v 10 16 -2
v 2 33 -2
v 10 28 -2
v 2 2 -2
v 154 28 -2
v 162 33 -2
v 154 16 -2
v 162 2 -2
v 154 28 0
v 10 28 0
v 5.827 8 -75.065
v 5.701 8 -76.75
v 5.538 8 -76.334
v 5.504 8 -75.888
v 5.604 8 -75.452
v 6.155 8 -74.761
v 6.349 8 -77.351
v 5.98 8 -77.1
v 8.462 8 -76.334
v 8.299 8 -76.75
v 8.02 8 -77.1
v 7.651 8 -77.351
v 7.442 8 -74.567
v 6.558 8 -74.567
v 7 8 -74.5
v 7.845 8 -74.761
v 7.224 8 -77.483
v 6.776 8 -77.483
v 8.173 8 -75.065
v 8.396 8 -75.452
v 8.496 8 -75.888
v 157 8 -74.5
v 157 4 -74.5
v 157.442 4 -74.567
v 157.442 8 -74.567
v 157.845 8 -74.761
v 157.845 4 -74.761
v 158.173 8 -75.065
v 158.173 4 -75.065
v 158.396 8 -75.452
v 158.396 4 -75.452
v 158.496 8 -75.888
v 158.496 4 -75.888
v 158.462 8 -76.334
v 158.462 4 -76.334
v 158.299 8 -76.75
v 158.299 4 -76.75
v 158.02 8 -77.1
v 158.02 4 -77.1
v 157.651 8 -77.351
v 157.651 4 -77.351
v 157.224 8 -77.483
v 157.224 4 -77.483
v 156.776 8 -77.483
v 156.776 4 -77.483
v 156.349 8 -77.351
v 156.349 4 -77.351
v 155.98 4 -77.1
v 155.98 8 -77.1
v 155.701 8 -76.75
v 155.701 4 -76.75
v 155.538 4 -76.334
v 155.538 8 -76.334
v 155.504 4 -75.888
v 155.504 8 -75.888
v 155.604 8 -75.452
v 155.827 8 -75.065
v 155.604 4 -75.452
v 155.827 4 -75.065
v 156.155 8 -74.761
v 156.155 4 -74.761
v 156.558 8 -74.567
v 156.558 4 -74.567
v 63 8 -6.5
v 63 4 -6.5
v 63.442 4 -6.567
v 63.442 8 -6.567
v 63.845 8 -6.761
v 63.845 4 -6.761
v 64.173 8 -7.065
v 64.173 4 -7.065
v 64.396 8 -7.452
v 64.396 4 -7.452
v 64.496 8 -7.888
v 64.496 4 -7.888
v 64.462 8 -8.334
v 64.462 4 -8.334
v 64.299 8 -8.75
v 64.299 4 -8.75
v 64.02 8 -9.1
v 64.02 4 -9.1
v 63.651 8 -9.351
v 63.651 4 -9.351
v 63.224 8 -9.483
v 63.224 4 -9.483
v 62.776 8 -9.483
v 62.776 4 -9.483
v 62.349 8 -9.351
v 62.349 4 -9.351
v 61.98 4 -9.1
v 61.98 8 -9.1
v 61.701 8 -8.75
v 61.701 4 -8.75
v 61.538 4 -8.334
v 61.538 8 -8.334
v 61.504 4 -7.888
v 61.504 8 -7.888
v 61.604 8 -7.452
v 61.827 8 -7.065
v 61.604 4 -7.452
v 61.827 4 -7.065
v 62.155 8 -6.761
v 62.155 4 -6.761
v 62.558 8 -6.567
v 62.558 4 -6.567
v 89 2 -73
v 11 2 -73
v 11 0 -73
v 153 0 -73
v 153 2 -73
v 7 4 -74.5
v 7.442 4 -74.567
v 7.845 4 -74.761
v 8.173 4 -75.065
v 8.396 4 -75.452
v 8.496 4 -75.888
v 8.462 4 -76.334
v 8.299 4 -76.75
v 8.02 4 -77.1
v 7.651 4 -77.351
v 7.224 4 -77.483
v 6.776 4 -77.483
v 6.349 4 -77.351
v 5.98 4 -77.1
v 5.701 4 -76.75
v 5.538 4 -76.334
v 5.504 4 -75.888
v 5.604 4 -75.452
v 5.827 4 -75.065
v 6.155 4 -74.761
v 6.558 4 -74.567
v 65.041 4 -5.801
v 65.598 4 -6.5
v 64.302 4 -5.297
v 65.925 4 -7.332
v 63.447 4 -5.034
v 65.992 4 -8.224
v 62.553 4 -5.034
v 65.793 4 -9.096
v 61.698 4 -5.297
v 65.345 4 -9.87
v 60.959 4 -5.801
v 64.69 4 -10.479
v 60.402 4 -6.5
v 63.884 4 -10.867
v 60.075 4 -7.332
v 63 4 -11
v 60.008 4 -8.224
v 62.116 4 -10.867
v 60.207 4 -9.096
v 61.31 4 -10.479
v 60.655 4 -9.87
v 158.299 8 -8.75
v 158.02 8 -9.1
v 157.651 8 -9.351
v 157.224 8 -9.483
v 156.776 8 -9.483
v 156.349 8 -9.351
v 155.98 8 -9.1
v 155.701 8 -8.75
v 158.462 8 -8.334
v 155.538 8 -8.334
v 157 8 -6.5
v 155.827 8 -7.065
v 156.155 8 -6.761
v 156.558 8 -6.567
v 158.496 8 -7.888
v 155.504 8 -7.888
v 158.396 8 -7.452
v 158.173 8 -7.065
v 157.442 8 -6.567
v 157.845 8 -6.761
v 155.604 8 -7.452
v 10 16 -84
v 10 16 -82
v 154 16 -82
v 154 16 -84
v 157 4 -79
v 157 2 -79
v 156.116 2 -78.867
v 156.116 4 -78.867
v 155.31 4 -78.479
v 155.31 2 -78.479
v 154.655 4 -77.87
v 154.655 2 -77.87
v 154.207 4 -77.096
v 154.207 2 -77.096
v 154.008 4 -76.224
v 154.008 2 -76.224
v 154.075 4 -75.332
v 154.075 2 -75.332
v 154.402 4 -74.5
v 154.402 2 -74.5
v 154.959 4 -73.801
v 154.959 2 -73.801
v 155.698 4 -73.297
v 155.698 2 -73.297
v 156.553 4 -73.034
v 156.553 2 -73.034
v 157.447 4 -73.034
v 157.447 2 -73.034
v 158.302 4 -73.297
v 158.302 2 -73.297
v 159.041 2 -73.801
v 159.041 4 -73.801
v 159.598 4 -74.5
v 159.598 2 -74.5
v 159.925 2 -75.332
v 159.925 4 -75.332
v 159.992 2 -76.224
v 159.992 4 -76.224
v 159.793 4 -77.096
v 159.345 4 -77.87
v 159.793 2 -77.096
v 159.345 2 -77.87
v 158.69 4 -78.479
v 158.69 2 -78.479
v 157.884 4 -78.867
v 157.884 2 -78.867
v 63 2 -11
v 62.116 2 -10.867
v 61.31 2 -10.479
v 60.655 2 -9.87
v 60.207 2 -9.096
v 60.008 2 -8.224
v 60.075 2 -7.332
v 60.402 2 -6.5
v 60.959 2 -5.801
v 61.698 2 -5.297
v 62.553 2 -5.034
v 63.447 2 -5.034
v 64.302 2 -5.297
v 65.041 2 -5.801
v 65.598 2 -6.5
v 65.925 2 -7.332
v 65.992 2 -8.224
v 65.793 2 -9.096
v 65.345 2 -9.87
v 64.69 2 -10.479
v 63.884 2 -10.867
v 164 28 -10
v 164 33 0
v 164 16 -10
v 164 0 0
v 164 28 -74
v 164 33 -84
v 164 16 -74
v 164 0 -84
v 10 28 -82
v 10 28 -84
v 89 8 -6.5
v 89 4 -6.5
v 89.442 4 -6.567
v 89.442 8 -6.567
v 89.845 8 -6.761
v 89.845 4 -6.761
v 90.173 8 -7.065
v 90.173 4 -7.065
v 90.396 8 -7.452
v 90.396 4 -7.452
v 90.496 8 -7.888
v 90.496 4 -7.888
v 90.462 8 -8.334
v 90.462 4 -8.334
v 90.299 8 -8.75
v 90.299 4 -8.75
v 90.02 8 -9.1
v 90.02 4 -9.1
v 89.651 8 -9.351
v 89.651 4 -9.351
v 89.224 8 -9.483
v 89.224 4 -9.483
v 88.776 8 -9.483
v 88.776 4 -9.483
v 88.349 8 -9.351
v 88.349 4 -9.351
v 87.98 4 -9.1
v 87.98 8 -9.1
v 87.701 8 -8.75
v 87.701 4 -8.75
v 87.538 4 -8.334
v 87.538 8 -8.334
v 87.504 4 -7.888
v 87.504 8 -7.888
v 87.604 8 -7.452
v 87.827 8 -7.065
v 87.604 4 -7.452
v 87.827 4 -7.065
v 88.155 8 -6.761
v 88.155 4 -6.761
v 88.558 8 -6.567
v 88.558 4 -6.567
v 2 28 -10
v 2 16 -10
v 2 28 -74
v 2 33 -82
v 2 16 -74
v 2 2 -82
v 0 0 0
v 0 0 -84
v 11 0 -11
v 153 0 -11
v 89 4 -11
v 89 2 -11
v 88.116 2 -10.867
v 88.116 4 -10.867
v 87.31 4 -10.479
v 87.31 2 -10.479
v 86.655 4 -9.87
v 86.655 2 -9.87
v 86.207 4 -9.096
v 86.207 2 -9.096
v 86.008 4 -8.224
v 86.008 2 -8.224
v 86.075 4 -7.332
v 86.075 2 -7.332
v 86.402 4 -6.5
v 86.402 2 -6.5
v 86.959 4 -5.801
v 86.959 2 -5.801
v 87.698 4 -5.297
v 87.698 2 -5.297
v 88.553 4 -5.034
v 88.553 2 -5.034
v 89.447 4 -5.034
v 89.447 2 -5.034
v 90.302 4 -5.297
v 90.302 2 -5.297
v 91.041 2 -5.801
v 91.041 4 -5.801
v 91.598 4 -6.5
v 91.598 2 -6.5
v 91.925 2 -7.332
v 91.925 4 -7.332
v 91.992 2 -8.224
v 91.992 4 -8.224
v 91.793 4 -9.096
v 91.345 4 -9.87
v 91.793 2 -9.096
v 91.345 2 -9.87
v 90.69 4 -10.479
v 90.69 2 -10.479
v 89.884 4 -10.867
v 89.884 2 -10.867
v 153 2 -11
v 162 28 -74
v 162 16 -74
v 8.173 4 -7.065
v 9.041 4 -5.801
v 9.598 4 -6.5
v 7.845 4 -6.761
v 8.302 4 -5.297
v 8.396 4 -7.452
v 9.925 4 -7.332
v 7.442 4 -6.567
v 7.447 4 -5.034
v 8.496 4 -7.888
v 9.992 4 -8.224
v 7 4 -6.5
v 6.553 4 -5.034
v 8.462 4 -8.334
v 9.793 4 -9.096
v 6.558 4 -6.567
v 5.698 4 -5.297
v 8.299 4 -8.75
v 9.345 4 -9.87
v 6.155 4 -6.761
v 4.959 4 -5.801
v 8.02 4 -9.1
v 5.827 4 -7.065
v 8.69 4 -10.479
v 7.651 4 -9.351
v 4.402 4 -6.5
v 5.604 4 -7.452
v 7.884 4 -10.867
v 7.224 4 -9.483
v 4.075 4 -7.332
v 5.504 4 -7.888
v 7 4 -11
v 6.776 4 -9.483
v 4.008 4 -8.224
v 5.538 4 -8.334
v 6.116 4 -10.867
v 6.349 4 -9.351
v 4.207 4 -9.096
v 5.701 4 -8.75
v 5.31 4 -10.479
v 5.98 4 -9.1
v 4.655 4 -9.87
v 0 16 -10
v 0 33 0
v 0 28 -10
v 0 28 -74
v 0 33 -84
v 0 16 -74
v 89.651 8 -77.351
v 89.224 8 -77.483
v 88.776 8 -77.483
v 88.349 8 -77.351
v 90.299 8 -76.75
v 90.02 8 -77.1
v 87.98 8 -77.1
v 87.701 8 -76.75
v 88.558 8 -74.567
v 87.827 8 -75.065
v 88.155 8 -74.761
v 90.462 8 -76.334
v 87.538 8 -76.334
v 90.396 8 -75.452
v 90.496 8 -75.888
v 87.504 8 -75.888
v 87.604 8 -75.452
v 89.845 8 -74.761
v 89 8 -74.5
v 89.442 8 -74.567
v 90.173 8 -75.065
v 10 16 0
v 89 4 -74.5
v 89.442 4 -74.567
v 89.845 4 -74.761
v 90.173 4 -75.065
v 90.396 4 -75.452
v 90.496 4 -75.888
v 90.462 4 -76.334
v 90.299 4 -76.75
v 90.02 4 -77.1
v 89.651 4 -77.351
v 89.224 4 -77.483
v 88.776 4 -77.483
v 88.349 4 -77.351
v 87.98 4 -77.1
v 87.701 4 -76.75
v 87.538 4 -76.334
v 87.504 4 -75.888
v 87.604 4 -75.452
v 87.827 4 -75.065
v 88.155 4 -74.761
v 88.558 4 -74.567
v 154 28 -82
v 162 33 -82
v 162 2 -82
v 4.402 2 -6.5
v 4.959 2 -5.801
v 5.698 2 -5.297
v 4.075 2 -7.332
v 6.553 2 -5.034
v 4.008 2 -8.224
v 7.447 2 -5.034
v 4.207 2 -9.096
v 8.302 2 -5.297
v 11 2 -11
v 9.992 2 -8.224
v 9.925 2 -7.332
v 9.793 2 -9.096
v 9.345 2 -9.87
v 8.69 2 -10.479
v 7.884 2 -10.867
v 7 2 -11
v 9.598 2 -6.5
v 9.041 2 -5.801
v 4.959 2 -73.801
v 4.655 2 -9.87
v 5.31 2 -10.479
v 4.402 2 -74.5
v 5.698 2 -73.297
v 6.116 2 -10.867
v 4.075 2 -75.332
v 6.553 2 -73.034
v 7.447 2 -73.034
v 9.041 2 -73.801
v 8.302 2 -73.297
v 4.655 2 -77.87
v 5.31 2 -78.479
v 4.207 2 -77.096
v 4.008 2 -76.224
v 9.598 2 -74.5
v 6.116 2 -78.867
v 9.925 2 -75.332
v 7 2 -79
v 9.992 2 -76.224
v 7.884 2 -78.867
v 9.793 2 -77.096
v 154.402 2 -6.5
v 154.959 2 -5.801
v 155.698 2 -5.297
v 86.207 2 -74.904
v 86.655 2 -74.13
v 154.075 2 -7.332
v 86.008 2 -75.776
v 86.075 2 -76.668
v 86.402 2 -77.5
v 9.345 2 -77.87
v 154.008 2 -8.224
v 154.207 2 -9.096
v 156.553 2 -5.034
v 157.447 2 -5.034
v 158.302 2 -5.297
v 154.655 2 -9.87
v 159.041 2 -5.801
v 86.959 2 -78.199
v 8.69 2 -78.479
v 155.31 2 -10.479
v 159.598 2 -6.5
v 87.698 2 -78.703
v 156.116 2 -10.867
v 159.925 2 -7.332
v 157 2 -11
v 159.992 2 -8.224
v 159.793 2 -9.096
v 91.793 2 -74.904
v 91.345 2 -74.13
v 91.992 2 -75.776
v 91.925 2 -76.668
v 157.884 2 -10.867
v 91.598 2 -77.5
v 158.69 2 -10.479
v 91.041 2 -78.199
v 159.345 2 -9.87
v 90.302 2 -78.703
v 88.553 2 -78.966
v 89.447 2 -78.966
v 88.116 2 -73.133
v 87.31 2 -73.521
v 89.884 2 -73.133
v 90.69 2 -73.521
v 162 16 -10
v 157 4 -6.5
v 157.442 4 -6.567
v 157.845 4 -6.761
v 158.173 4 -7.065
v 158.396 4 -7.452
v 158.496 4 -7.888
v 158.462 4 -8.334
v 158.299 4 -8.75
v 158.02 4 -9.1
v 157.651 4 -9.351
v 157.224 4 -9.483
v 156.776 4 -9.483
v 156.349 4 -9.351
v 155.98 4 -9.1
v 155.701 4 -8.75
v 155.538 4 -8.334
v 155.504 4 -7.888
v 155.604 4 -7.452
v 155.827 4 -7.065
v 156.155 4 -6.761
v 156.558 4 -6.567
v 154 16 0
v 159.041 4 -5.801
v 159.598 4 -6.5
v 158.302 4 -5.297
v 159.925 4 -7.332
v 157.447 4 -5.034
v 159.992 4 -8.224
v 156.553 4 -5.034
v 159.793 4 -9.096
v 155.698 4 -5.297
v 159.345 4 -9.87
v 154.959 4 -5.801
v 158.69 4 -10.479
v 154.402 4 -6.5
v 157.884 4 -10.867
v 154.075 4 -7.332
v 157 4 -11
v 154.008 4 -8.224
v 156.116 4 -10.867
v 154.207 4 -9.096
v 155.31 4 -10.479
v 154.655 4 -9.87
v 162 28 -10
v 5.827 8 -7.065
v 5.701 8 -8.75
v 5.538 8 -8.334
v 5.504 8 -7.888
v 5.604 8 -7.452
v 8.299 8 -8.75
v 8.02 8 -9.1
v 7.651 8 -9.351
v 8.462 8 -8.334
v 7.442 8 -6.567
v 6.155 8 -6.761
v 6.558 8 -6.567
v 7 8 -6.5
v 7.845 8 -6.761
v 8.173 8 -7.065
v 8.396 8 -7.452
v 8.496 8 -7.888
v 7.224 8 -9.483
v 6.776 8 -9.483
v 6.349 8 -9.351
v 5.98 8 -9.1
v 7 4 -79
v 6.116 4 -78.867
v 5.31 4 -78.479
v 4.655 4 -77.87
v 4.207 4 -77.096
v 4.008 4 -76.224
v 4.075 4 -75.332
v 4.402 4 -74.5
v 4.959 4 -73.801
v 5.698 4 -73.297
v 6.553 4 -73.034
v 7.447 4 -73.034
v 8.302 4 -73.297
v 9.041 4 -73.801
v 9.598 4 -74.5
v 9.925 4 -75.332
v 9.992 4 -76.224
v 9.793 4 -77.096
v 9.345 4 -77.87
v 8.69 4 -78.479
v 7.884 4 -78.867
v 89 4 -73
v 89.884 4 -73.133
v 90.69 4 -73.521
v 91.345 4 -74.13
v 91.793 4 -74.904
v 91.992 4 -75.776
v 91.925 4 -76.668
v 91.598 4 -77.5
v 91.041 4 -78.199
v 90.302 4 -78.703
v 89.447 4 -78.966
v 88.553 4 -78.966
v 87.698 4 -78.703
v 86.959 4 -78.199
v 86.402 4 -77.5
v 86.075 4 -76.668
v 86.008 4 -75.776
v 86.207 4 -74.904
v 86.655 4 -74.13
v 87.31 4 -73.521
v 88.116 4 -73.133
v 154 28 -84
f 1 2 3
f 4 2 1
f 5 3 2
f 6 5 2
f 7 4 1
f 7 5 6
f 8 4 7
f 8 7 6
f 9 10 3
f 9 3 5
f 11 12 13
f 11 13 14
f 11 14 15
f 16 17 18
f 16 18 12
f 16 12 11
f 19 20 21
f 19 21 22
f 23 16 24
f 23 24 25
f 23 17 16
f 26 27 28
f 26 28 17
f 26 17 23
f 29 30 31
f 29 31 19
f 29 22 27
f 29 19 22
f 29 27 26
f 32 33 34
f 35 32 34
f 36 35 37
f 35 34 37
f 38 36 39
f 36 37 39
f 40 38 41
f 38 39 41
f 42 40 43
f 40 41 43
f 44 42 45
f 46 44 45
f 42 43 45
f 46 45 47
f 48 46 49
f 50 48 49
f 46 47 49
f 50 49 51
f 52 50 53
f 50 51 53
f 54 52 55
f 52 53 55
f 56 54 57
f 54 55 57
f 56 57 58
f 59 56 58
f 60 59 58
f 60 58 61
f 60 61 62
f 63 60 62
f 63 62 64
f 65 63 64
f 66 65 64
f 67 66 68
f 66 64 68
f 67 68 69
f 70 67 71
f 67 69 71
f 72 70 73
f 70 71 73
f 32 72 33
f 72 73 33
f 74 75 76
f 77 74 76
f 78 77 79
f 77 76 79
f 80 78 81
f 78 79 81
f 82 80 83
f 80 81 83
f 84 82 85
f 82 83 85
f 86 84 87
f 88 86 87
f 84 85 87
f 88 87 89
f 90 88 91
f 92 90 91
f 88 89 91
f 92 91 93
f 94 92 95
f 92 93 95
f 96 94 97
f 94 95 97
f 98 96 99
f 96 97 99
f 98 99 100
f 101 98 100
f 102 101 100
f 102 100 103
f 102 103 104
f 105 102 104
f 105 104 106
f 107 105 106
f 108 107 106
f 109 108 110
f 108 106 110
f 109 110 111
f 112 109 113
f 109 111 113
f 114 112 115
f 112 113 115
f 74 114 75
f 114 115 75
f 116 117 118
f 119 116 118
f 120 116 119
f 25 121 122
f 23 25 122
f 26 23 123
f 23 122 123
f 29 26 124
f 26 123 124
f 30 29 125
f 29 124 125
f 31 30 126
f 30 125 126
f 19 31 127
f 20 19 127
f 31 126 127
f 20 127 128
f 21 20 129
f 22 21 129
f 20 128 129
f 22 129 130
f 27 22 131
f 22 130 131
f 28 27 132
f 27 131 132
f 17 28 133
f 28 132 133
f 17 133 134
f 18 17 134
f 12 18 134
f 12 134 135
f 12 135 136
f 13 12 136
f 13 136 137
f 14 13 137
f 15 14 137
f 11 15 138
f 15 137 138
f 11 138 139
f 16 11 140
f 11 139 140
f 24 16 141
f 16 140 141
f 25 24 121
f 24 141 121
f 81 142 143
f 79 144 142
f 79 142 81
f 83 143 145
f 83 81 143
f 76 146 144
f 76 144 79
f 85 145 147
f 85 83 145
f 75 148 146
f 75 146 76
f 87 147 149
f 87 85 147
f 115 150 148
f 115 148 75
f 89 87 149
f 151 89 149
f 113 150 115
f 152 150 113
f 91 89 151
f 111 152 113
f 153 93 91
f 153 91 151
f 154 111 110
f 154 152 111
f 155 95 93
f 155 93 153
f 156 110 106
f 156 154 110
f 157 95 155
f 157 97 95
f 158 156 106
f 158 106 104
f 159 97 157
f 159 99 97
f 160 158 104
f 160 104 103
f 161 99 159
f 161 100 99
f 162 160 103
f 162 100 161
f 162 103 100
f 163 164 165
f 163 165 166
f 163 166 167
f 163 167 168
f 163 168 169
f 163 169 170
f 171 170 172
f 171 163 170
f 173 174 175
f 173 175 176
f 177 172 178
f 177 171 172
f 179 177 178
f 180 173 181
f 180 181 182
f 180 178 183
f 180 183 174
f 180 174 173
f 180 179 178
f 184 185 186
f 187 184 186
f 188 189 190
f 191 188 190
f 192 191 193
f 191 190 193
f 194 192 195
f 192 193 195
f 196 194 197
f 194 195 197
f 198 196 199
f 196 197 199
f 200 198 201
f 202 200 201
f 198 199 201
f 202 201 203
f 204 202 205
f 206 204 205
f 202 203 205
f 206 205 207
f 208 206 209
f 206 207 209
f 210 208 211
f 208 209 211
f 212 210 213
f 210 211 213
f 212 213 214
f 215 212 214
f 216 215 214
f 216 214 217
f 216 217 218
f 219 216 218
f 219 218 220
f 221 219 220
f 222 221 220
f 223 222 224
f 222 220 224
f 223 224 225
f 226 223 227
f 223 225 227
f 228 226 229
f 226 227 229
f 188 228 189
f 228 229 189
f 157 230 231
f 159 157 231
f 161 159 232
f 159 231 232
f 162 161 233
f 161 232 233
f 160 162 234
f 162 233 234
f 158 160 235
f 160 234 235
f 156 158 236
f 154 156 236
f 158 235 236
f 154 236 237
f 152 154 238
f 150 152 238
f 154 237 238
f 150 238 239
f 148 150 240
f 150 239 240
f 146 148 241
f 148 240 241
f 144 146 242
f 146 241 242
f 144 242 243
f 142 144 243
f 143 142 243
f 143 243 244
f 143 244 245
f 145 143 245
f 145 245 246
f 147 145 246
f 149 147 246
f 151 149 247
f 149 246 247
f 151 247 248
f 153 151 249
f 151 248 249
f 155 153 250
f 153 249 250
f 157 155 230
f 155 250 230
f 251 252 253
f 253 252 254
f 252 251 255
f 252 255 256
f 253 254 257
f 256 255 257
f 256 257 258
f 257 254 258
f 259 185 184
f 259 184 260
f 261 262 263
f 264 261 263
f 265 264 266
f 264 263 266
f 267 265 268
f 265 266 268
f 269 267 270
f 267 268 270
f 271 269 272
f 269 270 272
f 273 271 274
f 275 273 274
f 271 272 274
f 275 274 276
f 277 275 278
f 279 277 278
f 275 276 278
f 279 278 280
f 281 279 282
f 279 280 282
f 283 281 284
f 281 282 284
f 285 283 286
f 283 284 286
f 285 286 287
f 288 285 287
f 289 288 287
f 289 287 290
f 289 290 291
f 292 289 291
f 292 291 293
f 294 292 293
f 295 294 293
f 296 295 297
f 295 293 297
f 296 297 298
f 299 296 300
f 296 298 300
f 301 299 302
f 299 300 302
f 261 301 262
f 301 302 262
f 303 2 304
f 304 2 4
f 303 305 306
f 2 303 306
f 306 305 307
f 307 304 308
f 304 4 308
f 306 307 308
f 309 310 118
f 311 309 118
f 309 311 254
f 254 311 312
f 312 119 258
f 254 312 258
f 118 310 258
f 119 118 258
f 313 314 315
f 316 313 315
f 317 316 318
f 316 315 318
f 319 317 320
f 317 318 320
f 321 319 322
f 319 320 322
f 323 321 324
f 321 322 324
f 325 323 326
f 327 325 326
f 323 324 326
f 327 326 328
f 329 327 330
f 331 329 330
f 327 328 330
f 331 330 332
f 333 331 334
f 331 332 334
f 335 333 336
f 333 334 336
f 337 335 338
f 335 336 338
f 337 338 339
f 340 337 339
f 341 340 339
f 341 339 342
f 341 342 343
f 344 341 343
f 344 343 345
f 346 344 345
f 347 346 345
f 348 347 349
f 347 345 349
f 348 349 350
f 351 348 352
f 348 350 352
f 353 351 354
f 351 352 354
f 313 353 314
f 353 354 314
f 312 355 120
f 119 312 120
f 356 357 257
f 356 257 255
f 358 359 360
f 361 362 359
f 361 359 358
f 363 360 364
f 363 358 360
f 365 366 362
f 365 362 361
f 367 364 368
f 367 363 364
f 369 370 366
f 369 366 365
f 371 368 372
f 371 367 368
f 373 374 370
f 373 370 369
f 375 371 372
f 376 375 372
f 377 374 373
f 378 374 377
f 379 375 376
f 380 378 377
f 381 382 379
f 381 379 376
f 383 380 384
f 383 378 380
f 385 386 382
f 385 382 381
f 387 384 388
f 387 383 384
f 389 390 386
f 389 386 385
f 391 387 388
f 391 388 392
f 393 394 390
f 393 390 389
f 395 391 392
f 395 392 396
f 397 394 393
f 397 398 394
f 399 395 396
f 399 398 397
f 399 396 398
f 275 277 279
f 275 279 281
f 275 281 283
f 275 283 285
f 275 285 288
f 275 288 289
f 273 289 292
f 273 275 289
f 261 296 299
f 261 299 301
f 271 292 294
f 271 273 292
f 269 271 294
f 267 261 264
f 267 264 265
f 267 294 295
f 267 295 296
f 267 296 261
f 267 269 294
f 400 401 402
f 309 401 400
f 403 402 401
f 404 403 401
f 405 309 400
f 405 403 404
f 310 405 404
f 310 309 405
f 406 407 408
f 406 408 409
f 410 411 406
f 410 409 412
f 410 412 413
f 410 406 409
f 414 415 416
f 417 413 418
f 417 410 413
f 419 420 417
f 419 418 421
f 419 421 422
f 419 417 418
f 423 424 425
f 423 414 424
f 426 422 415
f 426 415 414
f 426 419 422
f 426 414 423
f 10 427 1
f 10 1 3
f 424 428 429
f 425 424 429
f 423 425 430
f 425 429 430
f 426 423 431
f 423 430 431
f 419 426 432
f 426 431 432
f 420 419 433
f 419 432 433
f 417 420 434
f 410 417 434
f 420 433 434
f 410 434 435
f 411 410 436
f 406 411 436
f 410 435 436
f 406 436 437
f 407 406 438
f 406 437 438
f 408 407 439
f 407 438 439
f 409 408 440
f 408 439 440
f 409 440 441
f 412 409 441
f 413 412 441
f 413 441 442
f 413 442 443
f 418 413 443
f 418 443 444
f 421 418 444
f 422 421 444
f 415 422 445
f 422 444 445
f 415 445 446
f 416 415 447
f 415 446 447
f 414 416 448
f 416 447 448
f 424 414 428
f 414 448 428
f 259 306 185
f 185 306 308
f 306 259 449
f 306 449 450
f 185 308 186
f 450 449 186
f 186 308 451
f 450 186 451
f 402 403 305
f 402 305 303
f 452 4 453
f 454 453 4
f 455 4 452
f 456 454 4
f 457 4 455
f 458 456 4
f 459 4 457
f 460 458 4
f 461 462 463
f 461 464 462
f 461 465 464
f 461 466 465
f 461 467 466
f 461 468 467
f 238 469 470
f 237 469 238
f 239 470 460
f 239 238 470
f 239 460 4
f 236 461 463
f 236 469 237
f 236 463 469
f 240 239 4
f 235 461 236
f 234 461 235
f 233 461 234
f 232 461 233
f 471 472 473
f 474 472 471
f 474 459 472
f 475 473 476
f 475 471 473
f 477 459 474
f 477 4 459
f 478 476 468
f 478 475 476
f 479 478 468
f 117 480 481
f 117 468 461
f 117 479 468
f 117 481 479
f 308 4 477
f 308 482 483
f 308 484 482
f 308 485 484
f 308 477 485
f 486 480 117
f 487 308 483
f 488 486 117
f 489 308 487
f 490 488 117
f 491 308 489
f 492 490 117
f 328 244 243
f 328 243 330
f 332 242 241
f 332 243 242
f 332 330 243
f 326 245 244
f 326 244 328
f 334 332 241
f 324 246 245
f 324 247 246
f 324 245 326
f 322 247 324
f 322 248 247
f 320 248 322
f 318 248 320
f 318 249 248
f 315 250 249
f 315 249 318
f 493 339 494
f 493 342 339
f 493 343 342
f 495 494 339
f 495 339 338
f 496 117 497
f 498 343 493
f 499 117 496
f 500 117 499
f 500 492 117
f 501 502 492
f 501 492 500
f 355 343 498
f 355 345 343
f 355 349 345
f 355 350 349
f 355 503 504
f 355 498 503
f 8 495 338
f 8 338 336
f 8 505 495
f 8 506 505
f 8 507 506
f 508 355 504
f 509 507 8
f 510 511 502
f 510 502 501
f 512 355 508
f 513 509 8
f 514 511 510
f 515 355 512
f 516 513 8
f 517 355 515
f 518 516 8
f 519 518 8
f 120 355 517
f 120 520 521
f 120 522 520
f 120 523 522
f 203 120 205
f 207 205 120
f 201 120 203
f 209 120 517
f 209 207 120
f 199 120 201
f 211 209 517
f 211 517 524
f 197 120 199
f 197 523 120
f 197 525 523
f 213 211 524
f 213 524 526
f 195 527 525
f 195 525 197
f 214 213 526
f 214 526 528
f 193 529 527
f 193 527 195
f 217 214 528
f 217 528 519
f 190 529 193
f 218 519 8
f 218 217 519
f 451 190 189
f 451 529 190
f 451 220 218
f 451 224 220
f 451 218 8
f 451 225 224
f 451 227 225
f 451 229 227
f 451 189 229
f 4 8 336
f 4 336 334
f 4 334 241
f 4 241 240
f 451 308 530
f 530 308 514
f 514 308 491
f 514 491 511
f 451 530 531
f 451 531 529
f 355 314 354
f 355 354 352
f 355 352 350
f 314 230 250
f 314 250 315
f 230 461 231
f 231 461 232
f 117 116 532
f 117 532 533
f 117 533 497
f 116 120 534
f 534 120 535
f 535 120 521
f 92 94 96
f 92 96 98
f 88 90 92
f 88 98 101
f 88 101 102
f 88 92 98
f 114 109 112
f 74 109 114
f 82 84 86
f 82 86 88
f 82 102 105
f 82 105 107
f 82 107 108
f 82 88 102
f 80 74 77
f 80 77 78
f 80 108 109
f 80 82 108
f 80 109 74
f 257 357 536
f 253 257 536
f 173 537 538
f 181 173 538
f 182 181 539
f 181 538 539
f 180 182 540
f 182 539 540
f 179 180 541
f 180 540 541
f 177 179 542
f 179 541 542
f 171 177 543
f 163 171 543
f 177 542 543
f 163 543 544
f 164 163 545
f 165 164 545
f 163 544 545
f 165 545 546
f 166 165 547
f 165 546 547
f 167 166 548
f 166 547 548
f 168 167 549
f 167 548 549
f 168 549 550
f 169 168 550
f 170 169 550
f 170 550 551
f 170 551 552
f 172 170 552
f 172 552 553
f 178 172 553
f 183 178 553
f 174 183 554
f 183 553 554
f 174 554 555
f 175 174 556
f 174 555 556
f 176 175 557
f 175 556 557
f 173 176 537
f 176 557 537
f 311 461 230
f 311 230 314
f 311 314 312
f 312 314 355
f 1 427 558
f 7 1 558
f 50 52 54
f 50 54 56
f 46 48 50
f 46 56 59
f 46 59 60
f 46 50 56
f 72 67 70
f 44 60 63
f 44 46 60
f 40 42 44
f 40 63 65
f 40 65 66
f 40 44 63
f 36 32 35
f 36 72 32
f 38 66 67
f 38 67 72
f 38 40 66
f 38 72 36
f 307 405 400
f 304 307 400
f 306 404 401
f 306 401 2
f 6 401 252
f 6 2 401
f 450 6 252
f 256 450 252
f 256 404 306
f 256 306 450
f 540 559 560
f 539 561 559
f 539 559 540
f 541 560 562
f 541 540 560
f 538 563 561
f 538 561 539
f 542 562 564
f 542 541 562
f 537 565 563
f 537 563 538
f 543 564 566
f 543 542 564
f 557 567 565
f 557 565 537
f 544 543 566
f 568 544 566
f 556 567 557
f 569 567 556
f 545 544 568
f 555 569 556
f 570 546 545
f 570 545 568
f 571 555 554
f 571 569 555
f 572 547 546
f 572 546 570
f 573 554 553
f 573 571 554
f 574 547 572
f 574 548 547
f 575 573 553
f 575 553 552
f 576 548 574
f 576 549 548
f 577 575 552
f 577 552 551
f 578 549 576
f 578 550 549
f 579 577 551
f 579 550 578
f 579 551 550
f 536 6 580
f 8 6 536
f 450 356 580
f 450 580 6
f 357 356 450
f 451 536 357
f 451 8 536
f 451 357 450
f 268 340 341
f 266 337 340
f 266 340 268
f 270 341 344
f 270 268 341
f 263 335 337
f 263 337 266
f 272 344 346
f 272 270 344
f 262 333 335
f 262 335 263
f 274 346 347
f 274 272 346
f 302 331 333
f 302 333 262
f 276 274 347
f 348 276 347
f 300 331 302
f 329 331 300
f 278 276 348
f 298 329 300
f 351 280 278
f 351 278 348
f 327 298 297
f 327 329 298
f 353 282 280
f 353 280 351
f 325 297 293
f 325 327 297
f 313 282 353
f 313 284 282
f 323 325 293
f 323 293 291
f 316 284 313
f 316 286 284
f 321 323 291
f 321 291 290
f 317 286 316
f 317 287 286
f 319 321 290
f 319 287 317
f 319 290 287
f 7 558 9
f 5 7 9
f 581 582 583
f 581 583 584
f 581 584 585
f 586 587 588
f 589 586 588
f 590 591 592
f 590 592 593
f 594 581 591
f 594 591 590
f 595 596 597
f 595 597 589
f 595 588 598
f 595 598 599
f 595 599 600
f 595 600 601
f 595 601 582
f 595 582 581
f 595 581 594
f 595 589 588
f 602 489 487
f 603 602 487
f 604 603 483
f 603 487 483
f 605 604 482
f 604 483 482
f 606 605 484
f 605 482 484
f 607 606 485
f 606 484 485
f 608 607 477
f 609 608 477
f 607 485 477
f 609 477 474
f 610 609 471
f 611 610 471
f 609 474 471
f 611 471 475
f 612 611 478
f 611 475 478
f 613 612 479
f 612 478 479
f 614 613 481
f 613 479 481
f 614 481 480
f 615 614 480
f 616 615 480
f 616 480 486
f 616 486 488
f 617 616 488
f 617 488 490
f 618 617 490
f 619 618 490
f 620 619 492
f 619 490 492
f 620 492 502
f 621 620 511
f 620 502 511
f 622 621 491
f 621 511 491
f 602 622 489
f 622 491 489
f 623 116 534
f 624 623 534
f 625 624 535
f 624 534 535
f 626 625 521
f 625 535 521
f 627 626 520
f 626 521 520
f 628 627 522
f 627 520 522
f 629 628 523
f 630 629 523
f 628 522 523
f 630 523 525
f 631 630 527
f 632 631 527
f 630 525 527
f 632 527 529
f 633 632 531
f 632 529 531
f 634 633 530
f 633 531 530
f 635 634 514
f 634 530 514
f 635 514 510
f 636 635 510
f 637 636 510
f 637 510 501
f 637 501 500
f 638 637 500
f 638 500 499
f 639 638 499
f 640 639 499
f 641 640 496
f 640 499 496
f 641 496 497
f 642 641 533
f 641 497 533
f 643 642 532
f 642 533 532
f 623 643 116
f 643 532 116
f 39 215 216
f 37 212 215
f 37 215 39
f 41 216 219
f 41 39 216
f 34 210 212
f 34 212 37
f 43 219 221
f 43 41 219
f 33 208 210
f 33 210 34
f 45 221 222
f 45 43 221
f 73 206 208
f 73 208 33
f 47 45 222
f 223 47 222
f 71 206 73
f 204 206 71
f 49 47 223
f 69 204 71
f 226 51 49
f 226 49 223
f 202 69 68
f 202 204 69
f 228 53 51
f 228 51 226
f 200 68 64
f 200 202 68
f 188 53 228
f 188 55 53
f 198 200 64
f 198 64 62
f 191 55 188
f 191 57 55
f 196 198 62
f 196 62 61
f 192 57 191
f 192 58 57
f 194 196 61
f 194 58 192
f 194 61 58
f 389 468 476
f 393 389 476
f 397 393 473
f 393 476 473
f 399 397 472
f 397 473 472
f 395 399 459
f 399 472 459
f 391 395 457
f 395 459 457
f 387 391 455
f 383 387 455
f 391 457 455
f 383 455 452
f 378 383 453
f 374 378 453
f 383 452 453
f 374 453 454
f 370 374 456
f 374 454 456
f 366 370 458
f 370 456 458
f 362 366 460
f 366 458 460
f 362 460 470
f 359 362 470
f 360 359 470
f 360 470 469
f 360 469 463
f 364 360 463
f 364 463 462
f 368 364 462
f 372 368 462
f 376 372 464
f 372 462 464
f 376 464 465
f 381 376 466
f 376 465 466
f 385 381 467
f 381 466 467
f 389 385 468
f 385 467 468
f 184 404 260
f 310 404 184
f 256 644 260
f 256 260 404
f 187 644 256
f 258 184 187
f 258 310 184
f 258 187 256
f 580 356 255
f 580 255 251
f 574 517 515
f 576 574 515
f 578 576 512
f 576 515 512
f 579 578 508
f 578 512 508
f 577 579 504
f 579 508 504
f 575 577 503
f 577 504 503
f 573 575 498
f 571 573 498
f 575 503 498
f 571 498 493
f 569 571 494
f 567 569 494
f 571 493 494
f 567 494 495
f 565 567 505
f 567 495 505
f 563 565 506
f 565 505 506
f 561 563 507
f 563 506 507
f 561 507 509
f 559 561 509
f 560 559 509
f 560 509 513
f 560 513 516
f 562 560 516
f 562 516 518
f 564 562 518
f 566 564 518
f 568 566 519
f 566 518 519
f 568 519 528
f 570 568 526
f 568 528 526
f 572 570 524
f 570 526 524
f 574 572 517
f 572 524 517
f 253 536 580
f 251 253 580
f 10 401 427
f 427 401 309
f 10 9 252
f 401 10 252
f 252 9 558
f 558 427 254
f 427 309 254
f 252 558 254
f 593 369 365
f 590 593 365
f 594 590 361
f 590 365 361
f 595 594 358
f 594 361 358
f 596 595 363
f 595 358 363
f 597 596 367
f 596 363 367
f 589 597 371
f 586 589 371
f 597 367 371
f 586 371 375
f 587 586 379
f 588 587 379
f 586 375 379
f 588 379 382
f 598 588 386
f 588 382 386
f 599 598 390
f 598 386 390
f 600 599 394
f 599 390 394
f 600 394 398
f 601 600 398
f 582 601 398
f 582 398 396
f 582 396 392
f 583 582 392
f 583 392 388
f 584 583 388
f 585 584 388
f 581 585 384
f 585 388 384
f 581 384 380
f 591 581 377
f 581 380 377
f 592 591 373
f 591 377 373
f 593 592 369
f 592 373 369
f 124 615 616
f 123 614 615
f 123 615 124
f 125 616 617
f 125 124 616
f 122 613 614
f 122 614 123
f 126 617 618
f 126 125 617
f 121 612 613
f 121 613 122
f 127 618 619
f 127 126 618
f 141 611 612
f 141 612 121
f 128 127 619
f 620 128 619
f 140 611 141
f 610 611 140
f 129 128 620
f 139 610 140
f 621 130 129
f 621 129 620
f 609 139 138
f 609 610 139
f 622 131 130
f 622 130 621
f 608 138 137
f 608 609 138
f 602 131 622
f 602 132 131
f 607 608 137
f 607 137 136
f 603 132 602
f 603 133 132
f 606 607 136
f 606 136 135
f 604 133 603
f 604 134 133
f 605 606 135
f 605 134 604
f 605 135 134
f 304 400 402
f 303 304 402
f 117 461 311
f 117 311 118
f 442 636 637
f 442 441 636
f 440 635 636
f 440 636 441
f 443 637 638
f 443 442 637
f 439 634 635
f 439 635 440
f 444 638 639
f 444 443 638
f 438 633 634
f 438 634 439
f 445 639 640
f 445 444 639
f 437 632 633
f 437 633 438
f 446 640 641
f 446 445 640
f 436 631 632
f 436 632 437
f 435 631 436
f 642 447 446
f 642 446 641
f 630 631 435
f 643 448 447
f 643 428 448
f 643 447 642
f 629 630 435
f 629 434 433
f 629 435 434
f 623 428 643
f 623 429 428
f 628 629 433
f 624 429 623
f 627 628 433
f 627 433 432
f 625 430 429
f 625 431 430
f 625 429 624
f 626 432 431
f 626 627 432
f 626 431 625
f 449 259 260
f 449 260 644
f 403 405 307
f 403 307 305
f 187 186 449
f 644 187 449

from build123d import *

# Parameters (mm, degrees)
SKETCH1_W           = 164
SKETCH1_H           = 84
BOSS_EXTRUDE1_DEPTH = 33
SHELL1_T            = -2
SKETCH3_W           = 142
SKETCH3_H           = 62
CUT_EXTRUDE1_DEPTH  = 2
SKETCH4_R           = 3
BOSS_EXTRUDE2_DEPTH = 2
SKETCH5_R           = 1.5
BOSS_EXTRUDE3_DEPTH = 4
SKETCH6_R           = 3
BOSS_EXTRUDE4_DEPTH = 2
SKETCH7_R           = 1.5
BOSS_EXTRUDE5_DEPTH = 4
SKETCH8_W           = 64
SKETCH8_H           = 12
CUT_EXTRUDE2_DEPTH  = 188.192414376
SKETCH9_W           = 144
SKETCH9_H           = 12
CUT_EXTRUDE3_DEPTH  = 188.192414376


with BuildPart() as part:
    # Sketch1 → Boss-Extrude1 (new body)
    with BuildSketch(Plane(origin=(0, 0, 0), x_dir=(1, 0, 0), z_dir=(0, 1, 0))):
        with Locations((82, 42)):
            Rectangle(SKETCH1_W, SKETCH1_H)
    extrude(amount=BOSS_EXTRUDE1_DEPTH)

    # Shell1
    shell1_openings = [part.faces().sort_by_distance(p)[0] for p in [
        (82, 33, -42),
    ]]
    offset(amount=SHELL1_T, openings=shell1_openings, kind=Kind.INTERSECTION)

    # Sketch3 → Cut-Extrude1 (cut)
    with BuildSketch(Plane(origin=(0, 2, 0), x_dir=(1, 0, 0), z_dir=(0, 1, 0))):
        with Locations((82, 42)):
            Rectangle(SKETCH3_W, SKETCH3_H)
    extrude(amount=-CUT_EXTRUDE1_DEPTH, mode=Mode.SUBTRACT)

    # Sketch4 → Boss-Extrude2 (add)
    with BuildSketch(Plane(origin=(0, 2, 0), x_dir=(1, 0, 0), z_dir=(0, 1, 0))):
        with Locations(Location((157, 76, 0), (0, 0, 90))):
            Circle(SKETCH4_R)
        with Locations(Location((89, 76, 0), (0, 0, 270))):
            Circle(SKETCH4_R)
        with Locations(Location((89, 8, 0), (0, 0, 90))):
            Circle(SKETCH4_R)
        with Locations(Location((157, 8, 0), (0, 0, 90))):
            Circle(SKETCH4_R)
    extrude(amount=BOSS_EXTRUDE2_DEPTH)

    # Sketch5 → Boss-Extrude3 (add)
    with BuildSketch(Plane(origin=(0, 4, 0), x_dir=(1, 0, 0), z_dir=(0, 1, 0))):
        with Locations(Location((89, 76, 0), (0, 0, 270))):
            Circle(SKETCH5_R)
        with Locations(Location((157, 76, 0), (0, 0, 270))):
            Circle(SKETCH5_R)
        with Locations(Location((89, 8, 0), (0, 0, 270))):
            Circle(SKETCH5_R)
        with Locations(Location((157, 8, 0), (0, 0, 270))):
            Circle(SKETCH5_R)
    extrude(amount=BOSS_EXTRUDE3_DEPTH)

    # Sketch6 → Boss-Extrude4 (add)
    with BuildSketch(Plane(origin=(0, 2, 0), x_dir=(1, 0, 0), z_dir=(0, 1, 0))):
        with Locations(Location((7, 76, 0), (0, 0, 90))):
            Circle(SKETCH6_R)
        with Locations(Location((7, 8, 0), (0, 0, 90))):
            Circle(SKETCH6_R)
        with Locations(Location((63, 8, 0), (0, 0, 90))):
            Circle(SKETCH6_R)
    extrude(amount=BOSS_EXTRUDE4_DEPTH)

    # Sketch7 → Boss-Extrude5 (add)
    with BuildSketch(Plane(origin=(0, 4, 0), x_dir=(1, 0, 0), z_dir=(0, 1, 0))):
        with Locations(Location((7, 76, 0), (0, 0, 270))):
            Circle(SKETCH7_R)
        with Locations(Location((7, 8, 0), (0, 0, 270))):
            Circle(SKETCH7_R)
        with Locations(Location((63, 8, 0), (0, 0, 270))):
            Circle(SKETCH7_R)
    extrude(amount=BOSS_EXTRUDE5_DEPTH)

    # Sketch8 → Cut-Extrude2 (cut, through all)
    with BuildSketch(Plane.ZY):
        with Locations((-42, 22)):
            Rectangle(SKETCH8_W, SKETCH8_H)
    extrude(amount=-CUT_EXTRUDE2_DEPTH, mode=Mode.SUBTRACT)

    # Sketch9 → Cut-Extrude3 (cut, through all)
    with BuildSketch(Plane.XY):
        with Locations((82, 22)):
            Rectangle(SKETCH9_W, SKETCH9_H)
    extrude(amount=-CUT_EXTRUDE3_DEPTH, mode=Mode.SUBTRACT)


solid = part.part
